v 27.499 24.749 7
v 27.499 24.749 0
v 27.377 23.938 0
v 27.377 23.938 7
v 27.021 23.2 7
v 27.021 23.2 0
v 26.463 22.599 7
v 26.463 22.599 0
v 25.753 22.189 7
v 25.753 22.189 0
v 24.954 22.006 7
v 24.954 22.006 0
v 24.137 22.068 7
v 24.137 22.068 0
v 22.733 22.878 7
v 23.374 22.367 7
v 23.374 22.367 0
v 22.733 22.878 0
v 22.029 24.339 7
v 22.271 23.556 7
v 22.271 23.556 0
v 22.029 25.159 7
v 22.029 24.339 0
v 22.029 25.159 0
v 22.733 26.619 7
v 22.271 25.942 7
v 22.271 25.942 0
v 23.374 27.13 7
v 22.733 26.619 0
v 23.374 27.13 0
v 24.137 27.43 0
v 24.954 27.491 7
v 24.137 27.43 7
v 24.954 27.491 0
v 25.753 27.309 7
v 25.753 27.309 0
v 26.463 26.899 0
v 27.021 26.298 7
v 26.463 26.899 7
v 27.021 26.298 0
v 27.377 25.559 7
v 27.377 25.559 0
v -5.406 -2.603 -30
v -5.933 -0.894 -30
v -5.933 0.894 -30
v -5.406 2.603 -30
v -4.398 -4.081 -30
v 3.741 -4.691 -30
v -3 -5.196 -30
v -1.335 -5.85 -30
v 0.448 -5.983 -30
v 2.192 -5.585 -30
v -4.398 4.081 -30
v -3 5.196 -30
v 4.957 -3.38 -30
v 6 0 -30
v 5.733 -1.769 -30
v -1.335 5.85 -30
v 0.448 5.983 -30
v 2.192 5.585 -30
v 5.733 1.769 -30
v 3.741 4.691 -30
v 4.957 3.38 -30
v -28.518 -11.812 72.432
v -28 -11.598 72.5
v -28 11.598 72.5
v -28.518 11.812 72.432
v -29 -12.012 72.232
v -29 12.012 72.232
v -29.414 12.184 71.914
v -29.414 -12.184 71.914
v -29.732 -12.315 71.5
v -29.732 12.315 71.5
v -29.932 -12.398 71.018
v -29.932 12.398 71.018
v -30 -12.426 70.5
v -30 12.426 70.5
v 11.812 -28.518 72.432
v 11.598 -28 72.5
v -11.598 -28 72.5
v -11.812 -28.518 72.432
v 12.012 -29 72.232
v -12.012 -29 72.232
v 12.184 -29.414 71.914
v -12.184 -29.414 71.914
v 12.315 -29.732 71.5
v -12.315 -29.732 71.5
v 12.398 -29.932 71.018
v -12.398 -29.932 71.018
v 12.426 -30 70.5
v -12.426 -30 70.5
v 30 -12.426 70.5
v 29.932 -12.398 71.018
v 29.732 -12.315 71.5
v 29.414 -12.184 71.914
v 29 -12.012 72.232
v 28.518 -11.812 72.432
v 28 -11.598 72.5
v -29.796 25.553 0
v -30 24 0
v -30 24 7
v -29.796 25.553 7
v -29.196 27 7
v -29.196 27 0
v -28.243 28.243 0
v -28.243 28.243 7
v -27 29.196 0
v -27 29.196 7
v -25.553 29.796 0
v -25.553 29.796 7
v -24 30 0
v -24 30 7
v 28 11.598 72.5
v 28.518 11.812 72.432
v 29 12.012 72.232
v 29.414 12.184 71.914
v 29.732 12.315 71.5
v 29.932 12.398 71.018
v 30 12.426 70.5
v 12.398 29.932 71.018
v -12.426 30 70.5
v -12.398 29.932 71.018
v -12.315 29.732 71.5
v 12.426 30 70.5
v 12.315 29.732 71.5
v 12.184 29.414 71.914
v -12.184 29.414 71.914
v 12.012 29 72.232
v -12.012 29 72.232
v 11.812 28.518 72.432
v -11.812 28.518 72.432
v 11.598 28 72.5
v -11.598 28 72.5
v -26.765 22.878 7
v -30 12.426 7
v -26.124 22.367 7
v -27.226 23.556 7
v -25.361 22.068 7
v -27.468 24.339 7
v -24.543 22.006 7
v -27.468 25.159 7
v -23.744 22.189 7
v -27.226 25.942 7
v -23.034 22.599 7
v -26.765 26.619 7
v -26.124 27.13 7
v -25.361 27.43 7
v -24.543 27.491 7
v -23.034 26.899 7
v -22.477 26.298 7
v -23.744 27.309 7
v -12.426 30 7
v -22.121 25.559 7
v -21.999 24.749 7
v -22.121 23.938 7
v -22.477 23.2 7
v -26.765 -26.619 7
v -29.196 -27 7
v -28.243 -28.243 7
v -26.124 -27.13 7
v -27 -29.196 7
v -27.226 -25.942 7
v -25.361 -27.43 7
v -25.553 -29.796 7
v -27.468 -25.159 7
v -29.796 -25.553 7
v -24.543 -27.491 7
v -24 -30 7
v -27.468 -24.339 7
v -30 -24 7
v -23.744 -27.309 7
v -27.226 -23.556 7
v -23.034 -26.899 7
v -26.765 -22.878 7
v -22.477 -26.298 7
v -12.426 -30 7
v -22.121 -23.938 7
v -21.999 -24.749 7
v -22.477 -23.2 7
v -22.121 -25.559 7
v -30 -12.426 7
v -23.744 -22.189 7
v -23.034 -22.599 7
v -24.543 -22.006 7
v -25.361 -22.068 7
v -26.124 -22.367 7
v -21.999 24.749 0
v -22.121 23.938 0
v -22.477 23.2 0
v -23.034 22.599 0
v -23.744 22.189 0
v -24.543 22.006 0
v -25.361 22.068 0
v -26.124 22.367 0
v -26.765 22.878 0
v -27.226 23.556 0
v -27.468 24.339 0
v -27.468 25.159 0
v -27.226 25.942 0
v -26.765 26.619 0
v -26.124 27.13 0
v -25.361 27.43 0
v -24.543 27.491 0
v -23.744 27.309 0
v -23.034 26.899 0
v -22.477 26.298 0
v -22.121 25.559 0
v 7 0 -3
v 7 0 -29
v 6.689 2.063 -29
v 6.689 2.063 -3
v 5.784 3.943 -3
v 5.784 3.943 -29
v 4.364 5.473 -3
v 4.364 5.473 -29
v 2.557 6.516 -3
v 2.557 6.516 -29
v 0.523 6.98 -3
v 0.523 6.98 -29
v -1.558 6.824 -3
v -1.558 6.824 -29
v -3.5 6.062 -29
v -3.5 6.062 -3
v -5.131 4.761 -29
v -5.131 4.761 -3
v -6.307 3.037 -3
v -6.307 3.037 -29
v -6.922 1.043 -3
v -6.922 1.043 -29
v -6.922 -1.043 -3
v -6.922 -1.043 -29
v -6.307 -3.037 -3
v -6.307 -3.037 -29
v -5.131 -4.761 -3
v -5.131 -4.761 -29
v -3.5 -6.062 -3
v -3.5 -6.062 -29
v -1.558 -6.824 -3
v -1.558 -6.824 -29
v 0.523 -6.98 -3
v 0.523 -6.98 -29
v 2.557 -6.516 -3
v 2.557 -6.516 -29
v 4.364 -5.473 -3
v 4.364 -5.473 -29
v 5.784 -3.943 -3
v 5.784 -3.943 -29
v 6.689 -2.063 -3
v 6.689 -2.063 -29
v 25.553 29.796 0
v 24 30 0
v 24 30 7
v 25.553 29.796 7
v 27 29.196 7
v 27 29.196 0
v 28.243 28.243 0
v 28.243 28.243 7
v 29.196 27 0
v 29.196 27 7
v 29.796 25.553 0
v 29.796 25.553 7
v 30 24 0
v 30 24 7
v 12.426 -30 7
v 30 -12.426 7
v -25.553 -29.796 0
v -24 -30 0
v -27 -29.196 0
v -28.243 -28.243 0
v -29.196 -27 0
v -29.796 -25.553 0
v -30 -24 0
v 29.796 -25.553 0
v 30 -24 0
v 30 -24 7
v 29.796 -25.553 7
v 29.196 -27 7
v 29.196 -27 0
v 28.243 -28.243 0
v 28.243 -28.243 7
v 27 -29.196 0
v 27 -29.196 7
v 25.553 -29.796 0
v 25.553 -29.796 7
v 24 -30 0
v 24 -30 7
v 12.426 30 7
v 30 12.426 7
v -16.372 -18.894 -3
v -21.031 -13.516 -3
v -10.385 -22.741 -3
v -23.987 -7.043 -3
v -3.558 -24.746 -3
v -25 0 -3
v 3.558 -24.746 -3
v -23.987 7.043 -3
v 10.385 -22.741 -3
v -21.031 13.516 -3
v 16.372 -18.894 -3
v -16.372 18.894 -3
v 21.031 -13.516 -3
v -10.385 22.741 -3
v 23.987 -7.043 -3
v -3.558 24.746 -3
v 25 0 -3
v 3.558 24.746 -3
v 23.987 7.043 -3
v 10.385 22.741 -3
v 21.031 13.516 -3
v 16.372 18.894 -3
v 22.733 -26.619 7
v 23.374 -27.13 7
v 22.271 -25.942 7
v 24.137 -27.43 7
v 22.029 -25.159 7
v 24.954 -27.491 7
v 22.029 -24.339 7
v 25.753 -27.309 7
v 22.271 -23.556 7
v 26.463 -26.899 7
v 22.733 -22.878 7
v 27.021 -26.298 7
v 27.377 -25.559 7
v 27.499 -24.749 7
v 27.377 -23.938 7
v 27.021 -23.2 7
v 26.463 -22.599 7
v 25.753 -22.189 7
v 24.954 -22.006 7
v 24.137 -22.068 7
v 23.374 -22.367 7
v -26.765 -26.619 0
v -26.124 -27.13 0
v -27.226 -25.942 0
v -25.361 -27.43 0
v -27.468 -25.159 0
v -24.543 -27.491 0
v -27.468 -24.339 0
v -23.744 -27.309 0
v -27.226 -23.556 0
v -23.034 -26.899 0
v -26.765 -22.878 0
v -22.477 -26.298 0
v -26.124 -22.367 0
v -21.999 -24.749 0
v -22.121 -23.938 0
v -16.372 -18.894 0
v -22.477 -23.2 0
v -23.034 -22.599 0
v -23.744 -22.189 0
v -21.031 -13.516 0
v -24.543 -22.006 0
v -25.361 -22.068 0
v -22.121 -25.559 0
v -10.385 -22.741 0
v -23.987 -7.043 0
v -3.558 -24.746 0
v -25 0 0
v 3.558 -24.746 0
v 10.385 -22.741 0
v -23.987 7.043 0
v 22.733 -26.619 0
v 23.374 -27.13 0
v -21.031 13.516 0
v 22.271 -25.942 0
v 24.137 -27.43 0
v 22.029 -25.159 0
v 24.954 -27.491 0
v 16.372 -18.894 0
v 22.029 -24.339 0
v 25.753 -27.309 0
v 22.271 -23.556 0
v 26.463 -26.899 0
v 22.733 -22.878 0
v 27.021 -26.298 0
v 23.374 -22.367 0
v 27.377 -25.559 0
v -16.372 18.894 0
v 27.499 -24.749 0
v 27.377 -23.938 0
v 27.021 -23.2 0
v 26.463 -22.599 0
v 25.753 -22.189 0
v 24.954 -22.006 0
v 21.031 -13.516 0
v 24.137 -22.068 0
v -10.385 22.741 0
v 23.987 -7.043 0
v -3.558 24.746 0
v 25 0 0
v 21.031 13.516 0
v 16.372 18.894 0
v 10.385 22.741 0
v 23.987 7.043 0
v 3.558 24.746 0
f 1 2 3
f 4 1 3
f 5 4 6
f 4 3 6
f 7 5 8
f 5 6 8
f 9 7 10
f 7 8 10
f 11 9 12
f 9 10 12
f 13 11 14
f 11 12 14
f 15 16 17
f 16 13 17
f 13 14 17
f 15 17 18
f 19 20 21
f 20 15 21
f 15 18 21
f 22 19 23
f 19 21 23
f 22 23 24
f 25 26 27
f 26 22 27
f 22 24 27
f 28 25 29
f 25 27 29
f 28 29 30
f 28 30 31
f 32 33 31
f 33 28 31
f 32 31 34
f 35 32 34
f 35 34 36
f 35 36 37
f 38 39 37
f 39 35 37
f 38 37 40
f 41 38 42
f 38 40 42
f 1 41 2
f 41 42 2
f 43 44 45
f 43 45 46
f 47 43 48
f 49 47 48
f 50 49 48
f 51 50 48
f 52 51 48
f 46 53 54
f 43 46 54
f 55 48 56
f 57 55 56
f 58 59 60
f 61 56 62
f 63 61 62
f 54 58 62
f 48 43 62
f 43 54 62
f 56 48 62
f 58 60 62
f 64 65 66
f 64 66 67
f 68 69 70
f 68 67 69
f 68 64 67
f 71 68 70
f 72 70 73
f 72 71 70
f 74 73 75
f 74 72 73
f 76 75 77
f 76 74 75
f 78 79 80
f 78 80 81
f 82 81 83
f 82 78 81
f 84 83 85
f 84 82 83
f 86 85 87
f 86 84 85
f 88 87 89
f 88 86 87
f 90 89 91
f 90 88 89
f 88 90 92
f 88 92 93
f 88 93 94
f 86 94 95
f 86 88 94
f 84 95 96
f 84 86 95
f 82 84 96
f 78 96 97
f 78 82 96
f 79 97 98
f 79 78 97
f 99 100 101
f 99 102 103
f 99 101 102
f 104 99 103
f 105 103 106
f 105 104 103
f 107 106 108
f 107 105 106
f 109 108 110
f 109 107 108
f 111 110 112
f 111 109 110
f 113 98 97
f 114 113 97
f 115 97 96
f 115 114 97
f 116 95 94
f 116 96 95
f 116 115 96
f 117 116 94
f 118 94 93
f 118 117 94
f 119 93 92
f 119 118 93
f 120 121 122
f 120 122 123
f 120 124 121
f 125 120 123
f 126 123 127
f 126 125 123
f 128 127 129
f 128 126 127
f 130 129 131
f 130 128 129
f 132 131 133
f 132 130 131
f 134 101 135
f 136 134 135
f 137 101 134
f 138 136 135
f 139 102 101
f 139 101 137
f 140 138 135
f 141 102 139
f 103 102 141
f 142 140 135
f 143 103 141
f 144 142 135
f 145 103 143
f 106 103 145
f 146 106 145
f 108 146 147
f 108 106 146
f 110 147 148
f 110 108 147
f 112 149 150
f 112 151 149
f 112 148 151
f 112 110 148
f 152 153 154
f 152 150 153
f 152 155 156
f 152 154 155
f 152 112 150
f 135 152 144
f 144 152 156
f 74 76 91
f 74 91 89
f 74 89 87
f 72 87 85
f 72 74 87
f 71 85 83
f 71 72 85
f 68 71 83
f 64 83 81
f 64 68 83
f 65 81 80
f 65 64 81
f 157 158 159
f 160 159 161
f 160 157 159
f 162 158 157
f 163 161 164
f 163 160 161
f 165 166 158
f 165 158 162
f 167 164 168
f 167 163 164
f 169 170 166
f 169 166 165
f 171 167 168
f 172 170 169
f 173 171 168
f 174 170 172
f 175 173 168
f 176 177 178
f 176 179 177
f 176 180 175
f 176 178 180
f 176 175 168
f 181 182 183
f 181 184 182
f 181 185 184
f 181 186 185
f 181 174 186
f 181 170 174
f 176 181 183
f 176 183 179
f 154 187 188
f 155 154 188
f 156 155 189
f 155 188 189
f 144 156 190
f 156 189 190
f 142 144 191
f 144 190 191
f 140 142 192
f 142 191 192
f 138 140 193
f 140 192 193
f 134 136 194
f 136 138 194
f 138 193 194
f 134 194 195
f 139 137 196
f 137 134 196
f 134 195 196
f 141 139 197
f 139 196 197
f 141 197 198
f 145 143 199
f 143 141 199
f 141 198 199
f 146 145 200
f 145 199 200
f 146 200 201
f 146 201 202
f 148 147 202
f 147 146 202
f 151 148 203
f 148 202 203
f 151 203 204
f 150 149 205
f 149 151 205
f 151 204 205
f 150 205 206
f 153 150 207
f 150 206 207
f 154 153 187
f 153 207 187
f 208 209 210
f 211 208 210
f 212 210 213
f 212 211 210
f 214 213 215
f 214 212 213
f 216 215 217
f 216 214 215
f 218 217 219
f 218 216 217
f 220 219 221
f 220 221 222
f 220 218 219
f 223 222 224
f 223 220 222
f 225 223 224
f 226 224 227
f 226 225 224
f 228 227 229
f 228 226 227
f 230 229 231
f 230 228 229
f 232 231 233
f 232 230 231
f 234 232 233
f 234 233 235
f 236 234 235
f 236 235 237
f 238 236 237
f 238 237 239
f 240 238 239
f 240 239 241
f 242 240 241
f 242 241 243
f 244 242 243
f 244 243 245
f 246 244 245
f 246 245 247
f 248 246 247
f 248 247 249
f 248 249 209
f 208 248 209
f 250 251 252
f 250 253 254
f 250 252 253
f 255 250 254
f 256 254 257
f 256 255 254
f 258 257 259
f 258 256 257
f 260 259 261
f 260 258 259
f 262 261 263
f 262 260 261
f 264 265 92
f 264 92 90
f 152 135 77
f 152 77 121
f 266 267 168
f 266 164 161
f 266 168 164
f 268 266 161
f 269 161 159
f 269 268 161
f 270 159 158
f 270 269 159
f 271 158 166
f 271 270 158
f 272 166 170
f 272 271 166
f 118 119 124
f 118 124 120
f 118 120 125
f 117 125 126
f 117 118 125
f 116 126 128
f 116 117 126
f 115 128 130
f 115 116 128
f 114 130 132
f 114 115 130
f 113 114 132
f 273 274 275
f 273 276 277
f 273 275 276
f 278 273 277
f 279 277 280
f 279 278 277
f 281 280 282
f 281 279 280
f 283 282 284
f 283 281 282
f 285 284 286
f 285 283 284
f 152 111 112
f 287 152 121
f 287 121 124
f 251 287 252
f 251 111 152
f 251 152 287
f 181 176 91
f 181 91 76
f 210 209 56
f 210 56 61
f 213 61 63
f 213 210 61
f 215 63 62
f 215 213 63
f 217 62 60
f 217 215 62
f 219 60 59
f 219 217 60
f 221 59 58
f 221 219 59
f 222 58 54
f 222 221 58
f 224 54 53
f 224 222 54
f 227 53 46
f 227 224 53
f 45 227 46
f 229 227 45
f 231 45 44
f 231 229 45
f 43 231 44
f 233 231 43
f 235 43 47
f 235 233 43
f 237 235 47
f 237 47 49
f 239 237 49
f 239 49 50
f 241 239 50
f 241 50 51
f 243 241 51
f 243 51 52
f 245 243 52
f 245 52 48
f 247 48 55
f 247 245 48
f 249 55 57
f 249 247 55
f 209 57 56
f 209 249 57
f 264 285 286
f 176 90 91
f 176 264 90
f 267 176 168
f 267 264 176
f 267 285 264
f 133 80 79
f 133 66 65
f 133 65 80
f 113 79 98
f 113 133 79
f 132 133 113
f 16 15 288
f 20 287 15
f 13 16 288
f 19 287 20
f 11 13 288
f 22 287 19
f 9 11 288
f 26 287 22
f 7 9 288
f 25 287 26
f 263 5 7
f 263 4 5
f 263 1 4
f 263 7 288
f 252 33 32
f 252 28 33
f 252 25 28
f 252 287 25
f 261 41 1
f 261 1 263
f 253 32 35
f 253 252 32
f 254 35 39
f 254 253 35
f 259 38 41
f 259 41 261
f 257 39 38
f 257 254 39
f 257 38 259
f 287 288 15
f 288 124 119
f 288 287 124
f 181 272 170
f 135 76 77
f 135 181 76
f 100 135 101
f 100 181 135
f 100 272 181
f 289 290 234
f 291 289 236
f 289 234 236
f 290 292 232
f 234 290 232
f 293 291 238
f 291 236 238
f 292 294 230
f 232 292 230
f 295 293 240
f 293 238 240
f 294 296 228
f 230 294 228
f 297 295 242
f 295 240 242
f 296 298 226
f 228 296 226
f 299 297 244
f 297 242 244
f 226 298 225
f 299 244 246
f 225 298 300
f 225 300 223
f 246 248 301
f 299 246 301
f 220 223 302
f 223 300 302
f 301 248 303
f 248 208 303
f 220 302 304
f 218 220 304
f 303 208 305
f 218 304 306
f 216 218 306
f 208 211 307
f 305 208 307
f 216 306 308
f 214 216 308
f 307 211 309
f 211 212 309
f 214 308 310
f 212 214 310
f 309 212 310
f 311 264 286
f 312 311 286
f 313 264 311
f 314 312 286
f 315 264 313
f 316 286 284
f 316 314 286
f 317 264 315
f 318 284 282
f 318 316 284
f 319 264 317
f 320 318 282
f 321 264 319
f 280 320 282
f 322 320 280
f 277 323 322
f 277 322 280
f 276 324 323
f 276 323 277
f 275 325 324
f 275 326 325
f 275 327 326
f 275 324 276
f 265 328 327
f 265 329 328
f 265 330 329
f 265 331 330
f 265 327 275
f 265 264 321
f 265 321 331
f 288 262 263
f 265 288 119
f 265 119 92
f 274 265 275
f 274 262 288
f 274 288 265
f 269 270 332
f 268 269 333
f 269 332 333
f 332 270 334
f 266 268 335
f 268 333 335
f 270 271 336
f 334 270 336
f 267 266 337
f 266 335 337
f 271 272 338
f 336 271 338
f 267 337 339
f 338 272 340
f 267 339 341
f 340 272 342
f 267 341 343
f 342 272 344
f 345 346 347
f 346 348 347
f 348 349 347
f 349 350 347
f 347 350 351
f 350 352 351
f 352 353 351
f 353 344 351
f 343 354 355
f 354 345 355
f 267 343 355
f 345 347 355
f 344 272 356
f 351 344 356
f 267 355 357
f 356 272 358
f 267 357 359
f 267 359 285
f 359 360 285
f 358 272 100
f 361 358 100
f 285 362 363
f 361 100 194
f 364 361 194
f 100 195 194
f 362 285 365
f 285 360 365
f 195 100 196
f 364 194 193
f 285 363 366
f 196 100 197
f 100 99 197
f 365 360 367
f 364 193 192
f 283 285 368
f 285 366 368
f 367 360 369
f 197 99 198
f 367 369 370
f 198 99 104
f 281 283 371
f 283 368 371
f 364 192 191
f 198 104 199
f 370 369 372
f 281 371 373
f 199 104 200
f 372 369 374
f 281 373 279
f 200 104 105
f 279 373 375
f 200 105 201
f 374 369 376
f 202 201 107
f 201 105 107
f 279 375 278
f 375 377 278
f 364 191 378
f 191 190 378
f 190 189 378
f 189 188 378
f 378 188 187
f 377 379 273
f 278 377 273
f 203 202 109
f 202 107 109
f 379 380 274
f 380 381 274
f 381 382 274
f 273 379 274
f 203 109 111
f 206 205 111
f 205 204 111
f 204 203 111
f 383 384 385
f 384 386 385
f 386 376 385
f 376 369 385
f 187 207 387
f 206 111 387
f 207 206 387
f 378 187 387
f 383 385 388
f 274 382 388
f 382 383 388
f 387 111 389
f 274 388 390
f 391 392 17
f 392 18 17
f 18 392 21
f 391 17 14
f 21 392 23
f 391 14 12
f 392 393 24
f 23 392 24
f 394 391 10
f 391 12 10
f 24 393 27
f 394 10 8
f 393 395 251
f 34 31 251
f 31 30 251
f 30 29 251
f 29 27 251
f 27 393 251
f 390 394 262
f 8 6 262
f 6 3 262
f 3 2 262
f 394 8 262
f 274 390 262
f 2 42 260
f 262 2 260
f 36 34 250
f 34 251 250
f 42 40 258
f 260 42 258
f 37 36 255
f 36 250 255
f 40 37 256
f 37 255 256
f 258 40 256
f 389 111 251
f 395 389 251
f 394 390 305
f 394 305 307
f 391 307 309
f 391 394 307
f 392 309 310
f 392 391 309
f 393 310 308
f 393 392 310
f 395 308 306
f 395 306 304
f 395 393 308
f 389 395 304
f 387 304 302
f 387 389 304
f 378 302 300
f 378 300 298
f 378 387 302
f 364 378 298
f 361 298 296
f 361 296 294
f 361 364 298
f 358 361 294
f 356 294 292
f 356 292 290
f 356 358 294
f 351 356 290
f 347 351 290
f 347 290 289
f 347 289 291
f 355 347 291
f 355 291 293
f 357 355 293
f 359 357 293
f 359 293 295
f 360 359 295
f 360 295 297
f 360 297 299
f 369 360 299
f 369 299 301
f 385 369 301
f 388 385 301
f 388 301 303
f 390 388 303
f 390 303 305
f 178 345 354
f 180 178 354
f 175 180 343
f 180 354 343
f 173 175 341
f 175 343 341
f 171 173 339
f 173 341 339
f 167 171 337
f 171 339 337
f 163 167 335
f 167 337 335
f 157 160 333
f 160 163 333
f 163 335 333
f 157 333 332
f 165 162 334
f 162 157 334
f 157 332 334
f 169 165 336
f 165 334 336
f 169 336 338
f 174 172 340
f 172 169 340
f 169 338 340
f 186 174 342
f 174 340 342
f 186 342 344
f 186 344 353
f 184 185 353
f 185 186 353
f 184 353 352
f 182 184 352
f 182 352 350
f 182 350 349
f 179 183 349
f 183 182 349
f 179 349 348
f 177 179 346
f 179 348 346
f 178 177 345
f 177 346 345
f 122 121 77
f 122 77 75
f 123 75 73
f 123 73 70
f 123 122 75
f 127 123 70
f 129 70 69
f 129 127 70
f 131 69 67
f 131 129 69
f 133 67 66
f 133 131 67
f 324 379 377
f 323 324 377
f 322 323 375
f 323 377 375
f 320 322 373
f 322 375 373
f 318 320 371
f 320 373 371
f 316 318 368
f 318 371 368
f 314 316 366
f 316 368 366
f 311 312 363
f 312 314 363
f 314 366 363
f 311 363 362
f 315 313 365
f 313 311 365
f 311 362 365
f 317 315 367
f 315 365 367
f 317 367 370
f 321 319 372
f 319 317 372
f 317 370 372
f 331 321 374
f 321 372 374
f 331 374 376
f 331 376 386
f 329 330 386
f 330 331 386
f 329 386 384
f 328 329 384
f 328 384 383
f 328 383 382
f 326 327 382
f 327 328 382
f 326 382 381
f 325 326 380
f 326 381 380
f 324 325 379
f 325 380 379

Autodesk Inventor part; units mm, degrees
ref_plane "YZ Plane" through (0, 0, 0) normal (1, 0, 0) x (0, 1, 0)
ref_plane "XZ Plane" through (0, 0, 0) normal (0, 1, 0) x (-1, 0, 0)
ref_plane "XY Plane" through (0, 0, 0) normal (0, 0, 1) x (1, 0, 0)
sketch "Szkic1" plane through (0, 0, 0) normal (0, 0, 1) x (1, 0, 0)
  circle A0 centre (0, 0) radius 25
  circle A1 centre (0, 0) radius 7
  line L0 (-24, 30) -> (24, 30)
  line L1 (30, 24) -> (30, -24)
  line L2 (24, -30) -> (-24, -30)
  line L3 (-30, -24) -> (-30, 24)
  line L4 (-30, 30) -> (30, -30) construction
  line L5 (30, 30) -> (-30, -30) construction
  circle A2 centre (-24.7487, 24.7487) radius 2.75
  circle A3 centre (24.7487, 24.7487) radius 2.75
  circle A4 centre (-24.7487, -24.7487) radius 2.75
  circle A5 centre (24.7487, -24.7487) radius 2.75
  arc A6 (-24, 30) -> (-30, 24) centre (-24, 24) ccw
  arc A7 (30, 24) -> (24, 30) centre (24, 24) ccw
  arc A8 (24, -30) -> (30, -24) centre (24, -24) ccw
  arc A9 (-30, -24) -> (-24, -30) centre (-24, -24) ccw
  dimension "d0" = 50
  dimension "d1" = 14
  dimension "d2" = 60
  dimension "d3" = 60
  dimension "d5" = 5.5
  dimension "d6" = 5.5
  dimension "d7" = 5.5
  dimension "d8" = 5.5
  dimension "d9" = 6
extrude "Wyciągnięcie proste1" add sketch "Szkic1" along normal blind 7 contours A0 | A1 | L0 A7 L1 A8 L2 A9 L3 A6
extrude "Wyciągnięcie proste2" add sketch "Szkic1" against normal blind 3 contours A0
extrude "Wyciągnięcie proste3" add sketch "Szkic1" against normal blind 30 contours A1
sketch "Szkic2" plane through (0, 0, 7) normal (0, 0, 1) x (1, 0, 0)
  line L0 (-30, 12.4264) -> (-12.4264, 30)
  line L1 (12.4264, 30) -> (30, 12.4264)
  line L2 (30, -12.4264) -> (12.4264, -30)
  line L3 (-12.4264, -30) -> (-30, -12.4264)
  line L4 (-30, 30) -> (30, -30) construction
  line L5 (30, 30) -> (-30, -30) construction
  line L6 (-12.4264, 30) -> (12.4264, 30)
  line L7 (30, -24) -> (30, 24) projected
  line L8 (30, 12.4264) -> (30, -12.4264)
  line L9 (-24, -30) -> (24, -30) projected
  line L10 (12.4264, -30) -> (-12.4264, -30)
  line L11 (-30, 24) -> (-30, -24) projected
  line L12 (-30, -12.4264) -> (-30, 12.4264)
  point P0 (0, 0)
extrude "Wyciągnięcie proste4" add sketch "Szkic2" along normal blind 65.5
fillet "Zaokrąglenie1" radius 2 8 edges at (30, 0, 72.5) (21.2132, 21.2132, 72.5) (0, 30, 72.5) (-21.2132, 21.2132, 72.5) (-30, 0, 72.5) (21.2132, -21.2132, 72.5) (0, -30, 72.5) (-21.2132, -21.2132, 72.5)
chamfer "Faza1" distance 1 angle 45 1 edges at (-7, 0, -30)
properties part number "silnik_podstawa" material "Aluminium 6061-AHC"
